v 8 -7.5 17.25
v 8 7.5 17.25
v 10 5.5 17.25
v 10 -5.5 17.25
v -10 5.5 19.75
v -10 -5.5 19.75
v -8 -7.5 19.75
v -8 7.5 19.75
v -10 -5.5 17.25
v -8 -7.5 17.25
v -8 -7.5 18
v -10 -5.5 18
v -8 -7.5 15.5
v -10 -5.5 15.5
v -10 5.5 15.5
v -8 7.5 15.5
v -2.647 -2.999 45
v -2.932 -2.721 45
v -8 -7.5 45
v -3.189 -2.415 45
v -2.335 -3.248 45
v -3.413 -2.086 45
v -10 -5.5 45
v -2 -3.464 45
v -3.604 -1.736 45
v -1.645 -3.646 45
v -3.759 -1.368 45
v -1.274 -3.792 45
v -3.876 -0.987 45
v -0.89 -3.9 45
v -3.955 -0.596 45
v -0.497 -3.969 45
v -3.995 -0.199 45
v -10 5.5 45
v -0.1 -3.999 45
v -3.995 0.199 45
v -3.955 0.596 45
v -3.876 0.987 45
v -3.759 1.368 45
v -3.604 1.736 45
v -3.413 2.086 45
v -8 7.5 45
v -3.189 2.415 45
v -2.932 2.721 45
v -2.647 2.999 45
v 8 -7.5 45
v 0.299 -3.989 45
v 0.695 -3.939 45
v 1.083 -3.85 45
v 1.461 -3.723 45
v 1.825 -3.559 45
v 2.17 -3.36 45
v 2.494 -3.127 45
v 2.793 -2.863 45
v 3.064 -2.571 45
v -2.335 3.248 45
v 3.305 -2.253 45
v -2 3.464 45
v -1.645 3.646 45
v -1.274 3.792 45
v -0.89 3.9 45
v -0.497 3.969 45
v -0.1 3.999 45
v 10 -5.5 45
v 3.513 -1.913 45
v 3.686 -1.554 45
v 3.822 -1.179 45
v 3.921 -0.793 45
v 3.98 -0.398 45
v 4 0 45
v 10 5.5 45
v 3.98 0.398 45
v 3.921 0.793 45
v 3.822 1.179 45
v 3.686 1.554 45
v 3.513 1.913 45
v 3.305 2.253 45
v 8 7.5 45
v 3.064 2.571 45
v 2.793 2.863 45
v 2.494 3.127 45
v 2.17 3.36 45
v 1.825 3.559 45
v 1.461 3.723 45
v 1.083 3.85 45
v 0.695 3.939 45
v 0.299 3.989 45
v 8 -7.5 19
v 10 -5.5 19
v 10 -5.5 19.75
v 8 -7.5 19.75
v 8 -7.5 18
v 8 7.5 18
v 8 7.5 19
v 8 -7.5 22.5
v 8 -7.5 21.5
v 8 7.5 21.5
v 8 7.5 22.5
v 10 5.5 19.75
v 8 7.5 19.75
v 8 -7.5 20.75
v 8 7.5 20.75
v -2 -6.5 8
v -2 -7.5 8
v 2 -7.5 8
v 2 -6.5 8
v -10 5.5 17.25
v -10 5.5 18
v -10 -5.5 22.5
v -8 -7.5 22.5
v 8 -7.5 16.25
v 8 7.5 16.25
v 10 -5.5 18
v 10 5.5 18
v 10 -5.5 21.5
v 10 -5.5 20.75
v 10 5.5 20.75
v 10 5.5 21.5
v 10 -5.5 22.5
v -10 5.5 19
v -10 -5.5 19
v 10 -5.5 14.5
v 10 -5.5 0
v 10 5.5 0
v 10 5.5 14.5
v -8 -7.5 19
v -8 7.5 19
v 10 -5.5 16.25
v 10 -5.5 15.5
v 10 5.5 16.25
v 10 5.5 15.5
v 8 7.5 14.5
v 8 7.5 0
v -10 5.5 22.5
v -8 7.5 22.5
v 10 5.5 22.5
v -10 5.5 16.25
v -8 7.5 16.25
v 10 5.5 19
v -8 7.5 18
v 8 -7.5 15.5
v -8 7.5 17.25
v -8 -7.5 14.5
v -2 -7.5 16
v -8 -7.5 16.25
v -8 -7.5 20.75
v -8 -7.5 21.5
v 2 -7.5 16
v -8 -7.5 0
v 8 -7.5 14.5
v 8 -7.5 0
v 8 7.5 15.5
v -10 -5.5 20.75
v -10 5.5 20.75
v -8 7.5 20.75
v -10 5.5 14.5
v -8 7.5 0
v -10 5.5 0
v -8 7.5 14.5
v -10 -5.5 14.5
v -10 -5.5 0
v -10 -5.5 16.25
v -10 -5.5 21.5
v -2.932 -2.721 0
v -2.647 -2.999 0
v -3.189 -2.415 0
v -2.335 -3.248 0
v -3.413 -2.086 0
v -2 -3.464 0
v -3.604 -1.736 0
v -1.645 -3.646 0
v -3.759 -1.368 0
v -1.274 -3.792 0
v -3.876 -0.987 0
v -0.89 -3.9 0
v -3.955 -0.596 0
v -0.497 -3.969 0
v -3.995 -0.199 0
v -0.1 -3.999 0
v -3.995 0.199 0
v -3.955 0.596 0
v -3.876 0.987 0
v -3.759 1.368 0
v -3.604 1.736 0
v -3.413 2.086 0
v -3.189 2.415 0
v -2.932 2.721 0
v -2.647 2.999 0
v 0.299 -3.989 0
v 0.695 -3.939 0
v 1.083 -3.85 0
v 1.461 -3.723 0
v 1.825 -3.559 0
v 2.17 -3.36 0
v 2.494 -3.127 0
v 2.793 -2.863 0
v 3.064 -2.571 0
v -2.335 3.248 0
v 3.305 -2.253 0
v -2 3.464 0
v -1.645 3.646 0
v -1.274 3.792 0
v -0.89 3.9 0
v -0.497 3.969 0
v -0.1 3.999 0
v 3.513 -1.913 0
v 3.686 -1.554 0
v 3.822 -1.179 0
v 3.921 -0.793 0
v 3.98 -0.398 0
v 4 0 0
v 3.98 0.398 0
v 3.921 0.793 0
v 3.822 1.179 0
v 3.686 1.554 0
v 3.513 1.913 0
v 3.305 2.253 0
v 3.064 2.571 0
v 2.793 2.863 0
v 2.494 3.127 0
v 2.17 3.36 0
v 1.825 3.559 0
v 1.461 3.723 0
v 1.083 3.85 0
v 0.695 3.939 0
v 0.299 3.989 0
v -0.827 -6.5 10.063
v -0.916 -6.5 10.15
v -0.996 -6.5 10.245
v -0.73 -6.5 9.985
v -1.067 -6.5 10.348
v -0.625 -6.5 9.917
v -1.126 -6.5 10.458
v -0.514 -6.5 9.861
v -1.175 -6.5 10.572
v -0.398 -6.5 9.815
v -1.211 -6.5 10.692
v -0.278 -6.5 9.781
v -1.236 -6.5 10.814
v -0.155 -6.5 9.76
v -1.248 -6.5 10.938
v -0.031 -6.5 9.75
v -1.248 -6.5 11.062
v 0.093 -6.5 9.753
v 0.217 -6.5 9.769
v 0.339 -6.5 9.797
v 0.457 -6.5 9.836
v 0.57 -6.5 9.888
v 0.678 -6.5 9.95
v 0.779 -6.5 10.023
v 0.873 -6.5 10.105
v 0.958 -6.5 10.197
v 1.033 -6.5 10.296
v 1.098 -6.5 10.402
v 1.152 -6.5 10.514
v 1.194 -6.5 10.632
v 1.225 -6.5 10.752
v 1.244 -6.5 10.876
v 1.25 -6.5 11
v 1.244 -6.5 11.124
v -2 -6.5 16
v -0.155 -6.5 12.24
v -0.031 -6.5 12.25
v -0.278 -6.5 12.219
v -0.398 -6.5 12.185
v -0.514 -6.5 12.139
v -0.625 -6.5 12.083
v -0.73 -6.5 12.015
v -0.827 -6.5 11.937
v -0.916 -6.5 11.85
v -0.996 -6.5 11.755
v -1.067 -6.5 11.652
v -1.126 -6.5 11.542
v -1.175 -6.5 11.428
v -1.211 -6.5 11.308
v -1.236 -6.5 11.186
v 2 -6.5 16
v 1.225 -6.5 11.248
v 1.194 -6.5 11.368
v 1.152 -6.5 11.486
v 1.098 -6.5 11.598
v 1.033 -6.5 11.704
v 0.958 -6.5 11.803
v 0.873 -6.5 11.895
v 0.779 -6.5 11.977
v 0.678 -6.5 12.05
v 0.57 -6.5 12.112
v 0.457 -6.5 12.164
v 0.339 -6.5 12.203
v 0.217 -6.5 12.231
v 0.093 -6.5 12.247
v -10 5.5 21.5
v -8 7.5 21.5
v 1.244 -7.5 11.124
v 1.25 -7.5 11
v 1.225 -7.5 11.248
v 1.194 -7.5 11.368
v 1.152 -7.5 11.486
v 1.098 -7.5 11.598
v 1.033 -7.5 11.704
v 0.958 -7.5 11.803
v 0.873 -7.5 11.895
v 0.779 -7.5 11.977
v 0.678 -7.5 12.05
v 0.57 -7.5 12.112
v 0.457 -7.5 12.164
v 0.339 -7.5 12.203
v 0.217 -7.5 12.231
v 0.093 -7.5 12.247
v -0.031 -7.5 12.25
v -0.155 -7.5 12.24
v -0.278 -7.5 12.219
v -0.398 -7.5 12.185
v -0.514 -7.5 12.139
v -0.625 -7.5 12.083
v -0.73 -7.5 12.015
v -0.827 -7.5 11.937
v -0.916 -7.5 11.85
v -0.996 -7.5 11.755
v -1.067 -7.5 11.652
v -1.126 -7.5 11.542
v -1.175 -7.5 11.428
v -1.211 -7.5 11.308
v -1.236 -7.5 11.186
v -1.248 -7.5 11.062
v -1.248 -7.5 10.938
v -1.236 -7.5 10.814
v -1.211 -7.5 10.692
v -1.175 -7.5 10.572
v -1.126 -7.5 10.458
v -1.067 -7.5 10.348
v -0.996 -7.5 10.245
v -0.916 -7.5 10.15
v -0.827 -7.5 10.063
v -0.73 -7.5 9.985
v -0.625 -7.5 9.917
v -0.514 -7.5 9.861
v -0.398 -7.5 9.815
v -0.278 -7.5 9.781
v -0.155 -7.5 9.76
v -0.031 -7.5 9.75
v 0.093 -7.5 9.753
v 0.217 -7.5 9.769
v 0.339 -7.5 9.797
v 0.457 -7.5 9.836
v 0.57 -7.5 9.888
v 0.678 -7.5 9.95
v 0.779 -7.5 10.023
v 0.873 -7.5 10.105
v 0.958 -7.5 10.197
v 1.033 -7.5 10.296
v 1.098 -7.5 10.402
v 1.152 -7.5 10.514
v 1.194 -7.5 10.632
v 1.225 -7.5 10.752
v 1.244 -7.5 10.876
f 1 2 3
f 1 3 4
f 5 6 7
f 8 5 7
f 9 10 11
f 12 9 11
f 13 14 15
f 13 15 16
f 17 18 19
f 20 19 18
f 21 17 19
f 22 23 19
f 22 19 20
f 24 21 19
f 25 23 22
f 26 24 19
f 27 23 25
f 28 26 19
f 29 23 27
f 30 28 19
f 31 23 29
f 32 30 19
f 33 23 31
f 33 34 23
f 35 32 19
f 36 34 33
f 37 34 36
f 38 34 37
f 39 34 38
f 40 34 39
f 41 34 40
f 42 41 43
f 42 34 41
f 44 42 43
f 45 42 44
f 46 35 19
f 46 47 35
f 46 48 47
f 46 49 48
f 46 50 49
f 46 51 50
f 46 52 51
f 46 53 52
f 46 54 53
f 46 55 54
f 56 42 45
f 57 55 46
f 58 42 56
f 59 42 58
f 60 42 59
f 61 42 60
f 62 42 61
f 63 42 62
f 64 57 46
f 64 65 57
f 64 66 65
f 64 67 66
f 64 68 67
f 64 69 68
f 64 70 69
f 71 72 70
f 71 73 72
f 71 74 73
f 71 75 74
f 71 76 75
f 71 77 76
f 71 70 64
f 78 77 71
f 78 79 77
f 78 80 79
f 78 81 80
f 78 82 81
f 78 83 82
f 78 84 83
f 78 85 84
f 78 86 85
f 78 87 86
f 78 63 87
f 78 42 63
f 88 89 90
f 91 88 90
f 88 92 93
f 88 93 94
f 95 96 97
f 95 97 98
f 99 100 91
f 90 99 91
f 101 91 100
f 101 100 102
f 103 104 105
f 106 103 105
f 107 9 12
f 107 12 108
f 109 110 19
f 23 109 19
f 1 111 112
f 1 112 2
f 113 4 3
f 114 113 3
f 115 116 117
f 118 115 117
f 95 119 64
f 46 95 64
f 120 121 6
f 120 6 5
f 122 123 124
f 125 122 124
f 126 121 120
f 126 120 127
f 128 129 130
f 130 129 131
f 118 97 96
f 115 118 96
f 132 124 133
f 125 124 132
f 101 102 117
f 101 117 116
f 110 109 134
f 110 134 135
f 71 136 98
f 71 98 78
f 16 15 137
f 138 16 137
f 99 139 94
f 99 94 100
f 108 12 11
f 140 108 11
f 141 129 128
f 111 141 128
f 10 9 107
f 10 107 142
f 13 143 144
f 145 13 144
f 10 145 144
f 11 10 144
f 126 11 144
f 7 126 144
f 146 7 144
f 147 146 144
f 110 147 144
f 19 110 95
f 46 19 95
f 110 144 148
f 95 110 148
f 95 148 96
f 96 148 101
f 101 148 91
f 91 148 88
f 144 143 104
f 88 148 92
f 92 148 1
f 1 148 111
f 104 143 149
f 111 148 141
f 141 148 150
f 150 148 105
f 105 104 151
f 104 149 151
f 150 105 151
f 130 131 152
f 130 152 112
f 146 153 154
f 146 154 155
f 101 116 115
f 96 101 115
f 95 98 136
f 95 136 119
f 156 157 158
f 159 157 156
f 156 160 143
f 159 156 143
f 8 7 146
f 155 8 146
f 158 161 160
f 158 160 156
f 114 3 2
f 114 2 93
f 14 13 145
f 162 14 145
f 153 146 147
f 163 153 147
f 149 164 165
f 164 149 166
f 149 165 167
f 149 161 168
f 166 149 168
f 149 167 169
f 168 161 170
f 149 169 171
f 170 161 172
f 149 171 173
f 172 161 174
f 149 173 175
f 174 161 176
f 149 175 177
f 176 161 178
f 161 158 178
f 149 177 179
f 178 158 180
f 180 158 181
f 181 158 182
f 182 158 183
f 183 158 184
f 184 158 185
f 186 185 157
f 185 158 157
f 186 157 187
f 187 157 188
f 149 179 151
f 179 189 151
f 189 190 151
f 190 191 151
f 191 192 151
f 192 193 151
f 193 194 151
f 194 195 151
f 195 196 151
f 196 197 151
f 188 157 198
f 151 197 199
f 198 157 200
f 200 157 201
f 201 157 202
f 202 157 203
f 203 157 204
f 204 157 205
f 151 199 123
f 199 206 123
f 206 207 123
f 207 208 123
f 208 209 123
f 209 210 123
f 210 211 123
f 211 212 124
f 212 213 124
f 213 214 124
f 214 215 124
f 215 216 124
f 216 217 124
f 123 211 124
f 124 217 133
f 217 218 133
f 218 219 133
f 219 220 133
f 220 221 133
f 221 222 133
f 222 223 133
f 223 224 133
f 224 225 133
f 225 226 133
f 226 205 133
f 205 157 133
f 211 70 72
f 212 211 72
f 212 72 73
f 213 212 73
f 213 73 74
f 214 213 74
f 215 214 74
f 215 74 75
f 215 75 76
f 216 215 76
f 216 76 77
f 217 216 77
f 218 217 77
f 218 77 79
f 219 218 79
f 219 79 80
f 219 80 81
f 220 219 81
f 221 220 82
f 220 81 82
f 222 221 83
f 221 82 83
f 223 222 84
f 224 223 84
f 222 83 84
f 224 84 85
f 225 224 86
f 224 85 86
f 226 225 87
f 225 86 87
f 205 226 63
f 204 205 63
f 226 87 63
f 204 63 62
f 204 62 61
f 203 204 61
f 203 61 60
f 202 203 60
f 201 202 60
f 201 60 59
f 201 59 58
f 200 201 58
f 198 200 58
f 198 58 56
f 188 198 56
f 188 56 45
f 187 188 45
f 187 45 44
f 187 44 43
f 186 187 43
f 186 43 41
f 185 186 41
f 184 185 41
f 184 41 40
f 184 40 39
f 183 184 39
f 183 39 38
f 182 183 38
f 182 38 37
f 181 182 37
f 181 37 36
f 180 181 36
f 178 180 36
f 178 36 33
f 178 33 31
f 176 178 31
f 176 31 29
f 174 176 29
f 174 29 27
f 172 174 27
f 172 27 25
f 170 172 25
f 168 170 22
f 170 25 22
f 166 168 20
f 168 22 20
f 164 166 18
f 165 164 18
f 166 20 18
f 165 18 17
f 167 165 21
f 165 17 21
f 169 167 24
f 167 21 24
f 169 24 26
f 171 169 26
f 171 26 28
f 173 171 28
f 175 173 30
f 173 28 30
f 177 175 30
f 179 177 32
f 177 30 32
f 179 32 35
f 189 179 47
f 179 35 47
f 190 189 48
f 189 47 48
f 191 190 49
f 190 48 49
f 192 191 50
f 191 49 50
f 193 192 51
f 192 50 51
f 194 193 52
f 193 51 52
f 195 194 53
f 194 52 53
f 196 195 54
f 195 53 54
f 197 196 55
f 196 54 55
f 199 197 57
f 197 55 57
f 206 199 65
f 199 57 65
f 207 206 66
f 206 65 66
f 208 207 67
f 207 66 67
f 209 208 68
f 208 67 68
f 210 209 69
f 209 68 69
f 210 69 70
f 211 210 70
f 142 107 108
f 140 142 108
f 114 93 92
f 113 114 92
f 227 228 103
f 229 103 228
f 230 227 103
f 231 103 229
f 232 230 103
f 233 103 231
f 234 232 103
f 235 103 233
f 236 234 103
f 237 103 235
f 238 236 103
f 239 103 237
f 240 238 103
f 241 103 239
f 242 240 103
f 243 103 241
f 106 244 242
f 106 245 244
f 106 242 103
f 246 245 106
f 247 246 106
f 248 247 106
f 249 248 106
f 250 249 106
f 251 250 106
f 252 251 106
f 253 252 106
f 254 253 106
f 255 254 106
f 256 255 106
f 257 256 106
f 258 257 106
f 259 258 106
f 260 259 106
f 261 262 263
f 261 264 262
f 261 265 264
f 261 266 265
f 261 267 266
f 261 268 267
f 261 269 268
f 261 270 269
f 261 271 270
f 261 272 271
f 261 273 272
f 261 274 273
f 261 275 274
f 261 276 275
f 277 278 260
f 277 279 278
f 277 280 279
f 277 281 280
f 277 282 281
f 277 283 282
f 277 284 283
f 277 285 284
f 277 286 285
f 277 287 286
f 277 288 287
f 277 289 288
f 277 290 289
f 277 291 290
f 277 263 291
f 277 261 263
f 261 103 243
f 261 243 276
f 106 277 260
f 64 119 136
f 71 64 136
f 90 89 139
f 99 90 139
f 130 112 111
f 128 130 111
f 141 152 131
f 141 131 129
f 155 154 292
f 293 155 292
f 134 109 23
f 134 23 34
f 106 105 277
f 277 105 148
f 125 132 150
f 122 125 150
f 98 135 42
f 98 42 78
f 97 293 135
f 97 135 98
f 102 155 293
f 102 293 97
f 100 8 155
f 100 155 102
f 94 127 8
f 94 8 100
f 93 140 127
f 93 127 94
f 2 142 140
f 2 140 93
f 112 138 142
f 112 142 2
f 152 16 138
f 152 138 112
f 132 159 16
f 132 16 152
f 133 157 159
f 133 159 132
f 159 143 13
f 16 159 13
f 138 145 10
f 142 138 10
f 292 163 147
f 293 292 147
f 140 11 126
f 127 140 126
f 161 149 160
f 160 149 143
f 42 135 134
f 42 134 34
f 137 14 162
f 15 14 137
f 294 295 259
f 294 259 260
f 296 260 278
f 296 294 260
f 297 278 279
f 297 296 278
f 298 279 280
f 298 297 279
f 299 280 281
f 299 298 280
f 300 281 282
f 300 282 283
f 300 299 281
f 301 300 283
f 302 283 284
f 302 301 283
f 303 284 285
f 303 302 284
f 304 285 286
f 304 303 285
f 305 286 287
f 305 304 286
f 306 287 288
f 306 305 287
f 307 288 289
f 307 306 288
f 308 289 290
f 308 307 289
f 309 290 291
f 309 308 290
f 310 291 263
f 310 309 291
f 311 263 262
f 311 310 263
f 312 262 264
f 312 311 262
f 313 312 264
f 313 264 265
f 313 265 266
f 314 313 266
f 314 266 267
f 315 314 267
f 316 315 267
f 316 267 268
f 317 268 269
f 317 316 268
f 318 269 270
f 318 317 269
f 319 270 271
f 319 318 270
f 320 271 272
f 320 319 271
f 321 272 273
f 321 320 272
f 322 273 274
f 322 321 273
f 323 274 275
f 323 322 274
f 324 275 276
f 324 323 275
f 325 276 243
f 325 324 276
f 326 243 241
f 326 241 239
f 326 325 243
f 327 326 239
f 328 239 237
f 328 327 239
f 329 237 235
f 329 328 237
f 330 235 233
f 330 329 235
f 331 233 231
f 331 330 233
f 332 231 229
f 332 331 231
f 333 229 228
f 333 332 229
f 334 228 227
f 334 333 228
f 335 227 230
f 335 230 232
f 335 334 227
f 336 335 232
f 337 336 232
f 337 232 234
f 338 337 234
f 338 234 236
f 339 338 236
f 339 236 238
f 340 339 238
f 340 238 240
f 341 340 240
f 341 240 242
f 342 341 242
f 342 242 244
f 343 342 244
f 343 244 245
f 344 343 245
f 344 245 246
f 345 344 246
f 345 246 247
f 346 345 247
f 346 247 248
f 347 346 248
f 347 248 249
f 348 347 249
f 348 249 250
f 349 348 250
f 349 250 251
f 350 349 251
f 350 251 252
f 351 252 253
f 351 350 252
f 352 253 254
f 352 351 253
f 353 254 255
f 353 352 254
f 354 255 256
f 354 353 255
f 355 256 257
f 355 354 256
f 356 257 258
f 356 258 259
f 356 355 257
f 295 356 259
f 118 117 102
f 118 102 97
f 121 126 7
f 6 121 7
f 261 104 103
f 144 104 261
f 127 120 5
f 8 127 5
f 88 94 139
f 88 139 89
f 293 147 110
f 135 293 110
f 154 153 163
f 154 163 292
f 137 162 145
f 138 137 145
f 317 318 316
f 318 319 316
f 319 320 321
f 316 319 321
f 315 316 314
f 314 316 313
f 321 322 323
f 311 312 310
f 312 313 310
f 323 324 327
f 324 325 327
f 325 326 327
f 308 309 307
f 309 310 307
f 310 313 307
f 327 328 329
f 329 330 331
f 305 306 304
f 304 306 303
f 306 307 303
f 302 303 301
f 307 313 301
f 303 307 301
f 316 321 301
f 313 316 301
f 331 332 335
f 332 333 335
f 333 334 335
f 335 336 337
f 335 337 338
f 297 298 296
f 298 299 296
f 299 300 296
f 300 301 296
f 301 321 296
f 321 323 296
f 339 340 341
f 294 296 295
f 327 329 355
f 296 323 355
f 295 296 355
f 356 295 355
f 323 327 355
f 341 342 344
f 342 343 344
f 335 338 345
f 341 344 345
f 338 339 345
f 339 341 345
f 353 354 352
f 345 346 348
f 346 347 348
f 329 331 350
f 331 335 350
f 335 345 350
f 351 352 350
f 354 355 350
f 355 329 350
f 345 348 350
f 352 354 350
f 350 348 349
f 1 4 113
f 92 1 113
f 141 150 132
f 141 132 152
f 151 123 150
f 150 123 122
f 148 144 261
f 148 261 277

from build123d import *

# Parameters (mm, degrees)
SKETCH1_W           = 20
SKETCH1_H           = 15
BOSS_EXTRUDE1_DEPTH = 45
SKETCH2_R           = 4
CUT_EXTRUDE1_DEPTH  = 46
CHAMFER1_SIZE       = 2
SKETCH4_W           = 2
SKETCH4_H           = 1
CUT_EXTRUDE2_DEPTH  = 16
SKETCH5_W           = 4
SKETCH5_H           = 8
SKETCH5_R           = 1.25
CUT_EXTRUDE3_DEPTH  = 1


with BuildPart() as part:
    # Sketch1 → Boss-Extrude1 (new body)
    with BuildSketch(Plane.XY):
        Rectangle(SKETCH1_W, SKETCH1_H)
    extrude(amount=BOSS_EXTRUDE1_DEPTH)

    # Sketch2 → Cut-Extrude1 (cut, through all)
    with BuildSketch(Plane.XY.offset(45)):
        Circle(SKETCH2_R)
    extrude(amount=-CUT_EXTRUDE1_DEPTH, mode=Mode.SUBTRACT)

    # Chamfer1
    chamfer1_edges = [part.edges().sort_by_distance(p)[0] for p in [
        (10, 7.5, 22.5),
        (10, -7.5, 22.5),
        (-10, -7.5, 22.5),
        (-10, 7.5, 22.5),
    ]]
    chamfer(chamfer1_edges, length=CHAMFER1_SIZE)

    # Sketch4 → Cut-Extrude2 (cut, through all)
    with BuildSketch(Plane.XZ.offset(7.5)):
        with Locations((-9, 15)):
            Rectangle(SKETCH4_W, SKETCH4_H)
        with Locations((-9, 16.75)):
            Rectangle(SKETCH4_W, SKETCH4_H)
        with Locations((-9, 18.5)):
            Rectangle(SKETCH4_W, SKETCH4_H)
        with Locations((-9, 20.25)):
            Rectangle(SKETCH4_W, SKETCH4_H)
        with Locations((-9, 22)):
            Rectangle(SKETCH4_W, SKETCH4_H)
        with Locations((9, 22)):
            Rectangle(SKETCH4_W, SKETCH4_H)
        with Locations((9, 20.25)):
            Rectangle(SKETCH4_W, SKETCH4_H)
        with Locations((9, 18.5)):
            Rectangle(SKETCH4_W, SKETCH4_H)
        with Locations((9, 16.75)):
            Rectangle(SKETCH4_W, SKETCH4_H)
        with Locations((9, 15)):
            Rectangle(SKETCH4_W, SKETCH4_H)
    extrude(amount=-CUT_EXTRUDE2_DEPTH, mode=Mode.SUBTRACT)

    # Sketch5 → Cut-Extrude3 (cut)
    with BuildSketch(Plane.XZ.offset(7.5)):
        with Locations((0, 12)):
            Rectangle(SKETCH5_W, SKETCH5_H)
        with Locations((0, 11)):
            Circle(SKETCH5_R, mode=Mode.SUBTRACT)
    extrude(amount=-CUT_EXTRUDE3_DEPTH, mode=Mode.SUBTRACT)


solid = part.part
